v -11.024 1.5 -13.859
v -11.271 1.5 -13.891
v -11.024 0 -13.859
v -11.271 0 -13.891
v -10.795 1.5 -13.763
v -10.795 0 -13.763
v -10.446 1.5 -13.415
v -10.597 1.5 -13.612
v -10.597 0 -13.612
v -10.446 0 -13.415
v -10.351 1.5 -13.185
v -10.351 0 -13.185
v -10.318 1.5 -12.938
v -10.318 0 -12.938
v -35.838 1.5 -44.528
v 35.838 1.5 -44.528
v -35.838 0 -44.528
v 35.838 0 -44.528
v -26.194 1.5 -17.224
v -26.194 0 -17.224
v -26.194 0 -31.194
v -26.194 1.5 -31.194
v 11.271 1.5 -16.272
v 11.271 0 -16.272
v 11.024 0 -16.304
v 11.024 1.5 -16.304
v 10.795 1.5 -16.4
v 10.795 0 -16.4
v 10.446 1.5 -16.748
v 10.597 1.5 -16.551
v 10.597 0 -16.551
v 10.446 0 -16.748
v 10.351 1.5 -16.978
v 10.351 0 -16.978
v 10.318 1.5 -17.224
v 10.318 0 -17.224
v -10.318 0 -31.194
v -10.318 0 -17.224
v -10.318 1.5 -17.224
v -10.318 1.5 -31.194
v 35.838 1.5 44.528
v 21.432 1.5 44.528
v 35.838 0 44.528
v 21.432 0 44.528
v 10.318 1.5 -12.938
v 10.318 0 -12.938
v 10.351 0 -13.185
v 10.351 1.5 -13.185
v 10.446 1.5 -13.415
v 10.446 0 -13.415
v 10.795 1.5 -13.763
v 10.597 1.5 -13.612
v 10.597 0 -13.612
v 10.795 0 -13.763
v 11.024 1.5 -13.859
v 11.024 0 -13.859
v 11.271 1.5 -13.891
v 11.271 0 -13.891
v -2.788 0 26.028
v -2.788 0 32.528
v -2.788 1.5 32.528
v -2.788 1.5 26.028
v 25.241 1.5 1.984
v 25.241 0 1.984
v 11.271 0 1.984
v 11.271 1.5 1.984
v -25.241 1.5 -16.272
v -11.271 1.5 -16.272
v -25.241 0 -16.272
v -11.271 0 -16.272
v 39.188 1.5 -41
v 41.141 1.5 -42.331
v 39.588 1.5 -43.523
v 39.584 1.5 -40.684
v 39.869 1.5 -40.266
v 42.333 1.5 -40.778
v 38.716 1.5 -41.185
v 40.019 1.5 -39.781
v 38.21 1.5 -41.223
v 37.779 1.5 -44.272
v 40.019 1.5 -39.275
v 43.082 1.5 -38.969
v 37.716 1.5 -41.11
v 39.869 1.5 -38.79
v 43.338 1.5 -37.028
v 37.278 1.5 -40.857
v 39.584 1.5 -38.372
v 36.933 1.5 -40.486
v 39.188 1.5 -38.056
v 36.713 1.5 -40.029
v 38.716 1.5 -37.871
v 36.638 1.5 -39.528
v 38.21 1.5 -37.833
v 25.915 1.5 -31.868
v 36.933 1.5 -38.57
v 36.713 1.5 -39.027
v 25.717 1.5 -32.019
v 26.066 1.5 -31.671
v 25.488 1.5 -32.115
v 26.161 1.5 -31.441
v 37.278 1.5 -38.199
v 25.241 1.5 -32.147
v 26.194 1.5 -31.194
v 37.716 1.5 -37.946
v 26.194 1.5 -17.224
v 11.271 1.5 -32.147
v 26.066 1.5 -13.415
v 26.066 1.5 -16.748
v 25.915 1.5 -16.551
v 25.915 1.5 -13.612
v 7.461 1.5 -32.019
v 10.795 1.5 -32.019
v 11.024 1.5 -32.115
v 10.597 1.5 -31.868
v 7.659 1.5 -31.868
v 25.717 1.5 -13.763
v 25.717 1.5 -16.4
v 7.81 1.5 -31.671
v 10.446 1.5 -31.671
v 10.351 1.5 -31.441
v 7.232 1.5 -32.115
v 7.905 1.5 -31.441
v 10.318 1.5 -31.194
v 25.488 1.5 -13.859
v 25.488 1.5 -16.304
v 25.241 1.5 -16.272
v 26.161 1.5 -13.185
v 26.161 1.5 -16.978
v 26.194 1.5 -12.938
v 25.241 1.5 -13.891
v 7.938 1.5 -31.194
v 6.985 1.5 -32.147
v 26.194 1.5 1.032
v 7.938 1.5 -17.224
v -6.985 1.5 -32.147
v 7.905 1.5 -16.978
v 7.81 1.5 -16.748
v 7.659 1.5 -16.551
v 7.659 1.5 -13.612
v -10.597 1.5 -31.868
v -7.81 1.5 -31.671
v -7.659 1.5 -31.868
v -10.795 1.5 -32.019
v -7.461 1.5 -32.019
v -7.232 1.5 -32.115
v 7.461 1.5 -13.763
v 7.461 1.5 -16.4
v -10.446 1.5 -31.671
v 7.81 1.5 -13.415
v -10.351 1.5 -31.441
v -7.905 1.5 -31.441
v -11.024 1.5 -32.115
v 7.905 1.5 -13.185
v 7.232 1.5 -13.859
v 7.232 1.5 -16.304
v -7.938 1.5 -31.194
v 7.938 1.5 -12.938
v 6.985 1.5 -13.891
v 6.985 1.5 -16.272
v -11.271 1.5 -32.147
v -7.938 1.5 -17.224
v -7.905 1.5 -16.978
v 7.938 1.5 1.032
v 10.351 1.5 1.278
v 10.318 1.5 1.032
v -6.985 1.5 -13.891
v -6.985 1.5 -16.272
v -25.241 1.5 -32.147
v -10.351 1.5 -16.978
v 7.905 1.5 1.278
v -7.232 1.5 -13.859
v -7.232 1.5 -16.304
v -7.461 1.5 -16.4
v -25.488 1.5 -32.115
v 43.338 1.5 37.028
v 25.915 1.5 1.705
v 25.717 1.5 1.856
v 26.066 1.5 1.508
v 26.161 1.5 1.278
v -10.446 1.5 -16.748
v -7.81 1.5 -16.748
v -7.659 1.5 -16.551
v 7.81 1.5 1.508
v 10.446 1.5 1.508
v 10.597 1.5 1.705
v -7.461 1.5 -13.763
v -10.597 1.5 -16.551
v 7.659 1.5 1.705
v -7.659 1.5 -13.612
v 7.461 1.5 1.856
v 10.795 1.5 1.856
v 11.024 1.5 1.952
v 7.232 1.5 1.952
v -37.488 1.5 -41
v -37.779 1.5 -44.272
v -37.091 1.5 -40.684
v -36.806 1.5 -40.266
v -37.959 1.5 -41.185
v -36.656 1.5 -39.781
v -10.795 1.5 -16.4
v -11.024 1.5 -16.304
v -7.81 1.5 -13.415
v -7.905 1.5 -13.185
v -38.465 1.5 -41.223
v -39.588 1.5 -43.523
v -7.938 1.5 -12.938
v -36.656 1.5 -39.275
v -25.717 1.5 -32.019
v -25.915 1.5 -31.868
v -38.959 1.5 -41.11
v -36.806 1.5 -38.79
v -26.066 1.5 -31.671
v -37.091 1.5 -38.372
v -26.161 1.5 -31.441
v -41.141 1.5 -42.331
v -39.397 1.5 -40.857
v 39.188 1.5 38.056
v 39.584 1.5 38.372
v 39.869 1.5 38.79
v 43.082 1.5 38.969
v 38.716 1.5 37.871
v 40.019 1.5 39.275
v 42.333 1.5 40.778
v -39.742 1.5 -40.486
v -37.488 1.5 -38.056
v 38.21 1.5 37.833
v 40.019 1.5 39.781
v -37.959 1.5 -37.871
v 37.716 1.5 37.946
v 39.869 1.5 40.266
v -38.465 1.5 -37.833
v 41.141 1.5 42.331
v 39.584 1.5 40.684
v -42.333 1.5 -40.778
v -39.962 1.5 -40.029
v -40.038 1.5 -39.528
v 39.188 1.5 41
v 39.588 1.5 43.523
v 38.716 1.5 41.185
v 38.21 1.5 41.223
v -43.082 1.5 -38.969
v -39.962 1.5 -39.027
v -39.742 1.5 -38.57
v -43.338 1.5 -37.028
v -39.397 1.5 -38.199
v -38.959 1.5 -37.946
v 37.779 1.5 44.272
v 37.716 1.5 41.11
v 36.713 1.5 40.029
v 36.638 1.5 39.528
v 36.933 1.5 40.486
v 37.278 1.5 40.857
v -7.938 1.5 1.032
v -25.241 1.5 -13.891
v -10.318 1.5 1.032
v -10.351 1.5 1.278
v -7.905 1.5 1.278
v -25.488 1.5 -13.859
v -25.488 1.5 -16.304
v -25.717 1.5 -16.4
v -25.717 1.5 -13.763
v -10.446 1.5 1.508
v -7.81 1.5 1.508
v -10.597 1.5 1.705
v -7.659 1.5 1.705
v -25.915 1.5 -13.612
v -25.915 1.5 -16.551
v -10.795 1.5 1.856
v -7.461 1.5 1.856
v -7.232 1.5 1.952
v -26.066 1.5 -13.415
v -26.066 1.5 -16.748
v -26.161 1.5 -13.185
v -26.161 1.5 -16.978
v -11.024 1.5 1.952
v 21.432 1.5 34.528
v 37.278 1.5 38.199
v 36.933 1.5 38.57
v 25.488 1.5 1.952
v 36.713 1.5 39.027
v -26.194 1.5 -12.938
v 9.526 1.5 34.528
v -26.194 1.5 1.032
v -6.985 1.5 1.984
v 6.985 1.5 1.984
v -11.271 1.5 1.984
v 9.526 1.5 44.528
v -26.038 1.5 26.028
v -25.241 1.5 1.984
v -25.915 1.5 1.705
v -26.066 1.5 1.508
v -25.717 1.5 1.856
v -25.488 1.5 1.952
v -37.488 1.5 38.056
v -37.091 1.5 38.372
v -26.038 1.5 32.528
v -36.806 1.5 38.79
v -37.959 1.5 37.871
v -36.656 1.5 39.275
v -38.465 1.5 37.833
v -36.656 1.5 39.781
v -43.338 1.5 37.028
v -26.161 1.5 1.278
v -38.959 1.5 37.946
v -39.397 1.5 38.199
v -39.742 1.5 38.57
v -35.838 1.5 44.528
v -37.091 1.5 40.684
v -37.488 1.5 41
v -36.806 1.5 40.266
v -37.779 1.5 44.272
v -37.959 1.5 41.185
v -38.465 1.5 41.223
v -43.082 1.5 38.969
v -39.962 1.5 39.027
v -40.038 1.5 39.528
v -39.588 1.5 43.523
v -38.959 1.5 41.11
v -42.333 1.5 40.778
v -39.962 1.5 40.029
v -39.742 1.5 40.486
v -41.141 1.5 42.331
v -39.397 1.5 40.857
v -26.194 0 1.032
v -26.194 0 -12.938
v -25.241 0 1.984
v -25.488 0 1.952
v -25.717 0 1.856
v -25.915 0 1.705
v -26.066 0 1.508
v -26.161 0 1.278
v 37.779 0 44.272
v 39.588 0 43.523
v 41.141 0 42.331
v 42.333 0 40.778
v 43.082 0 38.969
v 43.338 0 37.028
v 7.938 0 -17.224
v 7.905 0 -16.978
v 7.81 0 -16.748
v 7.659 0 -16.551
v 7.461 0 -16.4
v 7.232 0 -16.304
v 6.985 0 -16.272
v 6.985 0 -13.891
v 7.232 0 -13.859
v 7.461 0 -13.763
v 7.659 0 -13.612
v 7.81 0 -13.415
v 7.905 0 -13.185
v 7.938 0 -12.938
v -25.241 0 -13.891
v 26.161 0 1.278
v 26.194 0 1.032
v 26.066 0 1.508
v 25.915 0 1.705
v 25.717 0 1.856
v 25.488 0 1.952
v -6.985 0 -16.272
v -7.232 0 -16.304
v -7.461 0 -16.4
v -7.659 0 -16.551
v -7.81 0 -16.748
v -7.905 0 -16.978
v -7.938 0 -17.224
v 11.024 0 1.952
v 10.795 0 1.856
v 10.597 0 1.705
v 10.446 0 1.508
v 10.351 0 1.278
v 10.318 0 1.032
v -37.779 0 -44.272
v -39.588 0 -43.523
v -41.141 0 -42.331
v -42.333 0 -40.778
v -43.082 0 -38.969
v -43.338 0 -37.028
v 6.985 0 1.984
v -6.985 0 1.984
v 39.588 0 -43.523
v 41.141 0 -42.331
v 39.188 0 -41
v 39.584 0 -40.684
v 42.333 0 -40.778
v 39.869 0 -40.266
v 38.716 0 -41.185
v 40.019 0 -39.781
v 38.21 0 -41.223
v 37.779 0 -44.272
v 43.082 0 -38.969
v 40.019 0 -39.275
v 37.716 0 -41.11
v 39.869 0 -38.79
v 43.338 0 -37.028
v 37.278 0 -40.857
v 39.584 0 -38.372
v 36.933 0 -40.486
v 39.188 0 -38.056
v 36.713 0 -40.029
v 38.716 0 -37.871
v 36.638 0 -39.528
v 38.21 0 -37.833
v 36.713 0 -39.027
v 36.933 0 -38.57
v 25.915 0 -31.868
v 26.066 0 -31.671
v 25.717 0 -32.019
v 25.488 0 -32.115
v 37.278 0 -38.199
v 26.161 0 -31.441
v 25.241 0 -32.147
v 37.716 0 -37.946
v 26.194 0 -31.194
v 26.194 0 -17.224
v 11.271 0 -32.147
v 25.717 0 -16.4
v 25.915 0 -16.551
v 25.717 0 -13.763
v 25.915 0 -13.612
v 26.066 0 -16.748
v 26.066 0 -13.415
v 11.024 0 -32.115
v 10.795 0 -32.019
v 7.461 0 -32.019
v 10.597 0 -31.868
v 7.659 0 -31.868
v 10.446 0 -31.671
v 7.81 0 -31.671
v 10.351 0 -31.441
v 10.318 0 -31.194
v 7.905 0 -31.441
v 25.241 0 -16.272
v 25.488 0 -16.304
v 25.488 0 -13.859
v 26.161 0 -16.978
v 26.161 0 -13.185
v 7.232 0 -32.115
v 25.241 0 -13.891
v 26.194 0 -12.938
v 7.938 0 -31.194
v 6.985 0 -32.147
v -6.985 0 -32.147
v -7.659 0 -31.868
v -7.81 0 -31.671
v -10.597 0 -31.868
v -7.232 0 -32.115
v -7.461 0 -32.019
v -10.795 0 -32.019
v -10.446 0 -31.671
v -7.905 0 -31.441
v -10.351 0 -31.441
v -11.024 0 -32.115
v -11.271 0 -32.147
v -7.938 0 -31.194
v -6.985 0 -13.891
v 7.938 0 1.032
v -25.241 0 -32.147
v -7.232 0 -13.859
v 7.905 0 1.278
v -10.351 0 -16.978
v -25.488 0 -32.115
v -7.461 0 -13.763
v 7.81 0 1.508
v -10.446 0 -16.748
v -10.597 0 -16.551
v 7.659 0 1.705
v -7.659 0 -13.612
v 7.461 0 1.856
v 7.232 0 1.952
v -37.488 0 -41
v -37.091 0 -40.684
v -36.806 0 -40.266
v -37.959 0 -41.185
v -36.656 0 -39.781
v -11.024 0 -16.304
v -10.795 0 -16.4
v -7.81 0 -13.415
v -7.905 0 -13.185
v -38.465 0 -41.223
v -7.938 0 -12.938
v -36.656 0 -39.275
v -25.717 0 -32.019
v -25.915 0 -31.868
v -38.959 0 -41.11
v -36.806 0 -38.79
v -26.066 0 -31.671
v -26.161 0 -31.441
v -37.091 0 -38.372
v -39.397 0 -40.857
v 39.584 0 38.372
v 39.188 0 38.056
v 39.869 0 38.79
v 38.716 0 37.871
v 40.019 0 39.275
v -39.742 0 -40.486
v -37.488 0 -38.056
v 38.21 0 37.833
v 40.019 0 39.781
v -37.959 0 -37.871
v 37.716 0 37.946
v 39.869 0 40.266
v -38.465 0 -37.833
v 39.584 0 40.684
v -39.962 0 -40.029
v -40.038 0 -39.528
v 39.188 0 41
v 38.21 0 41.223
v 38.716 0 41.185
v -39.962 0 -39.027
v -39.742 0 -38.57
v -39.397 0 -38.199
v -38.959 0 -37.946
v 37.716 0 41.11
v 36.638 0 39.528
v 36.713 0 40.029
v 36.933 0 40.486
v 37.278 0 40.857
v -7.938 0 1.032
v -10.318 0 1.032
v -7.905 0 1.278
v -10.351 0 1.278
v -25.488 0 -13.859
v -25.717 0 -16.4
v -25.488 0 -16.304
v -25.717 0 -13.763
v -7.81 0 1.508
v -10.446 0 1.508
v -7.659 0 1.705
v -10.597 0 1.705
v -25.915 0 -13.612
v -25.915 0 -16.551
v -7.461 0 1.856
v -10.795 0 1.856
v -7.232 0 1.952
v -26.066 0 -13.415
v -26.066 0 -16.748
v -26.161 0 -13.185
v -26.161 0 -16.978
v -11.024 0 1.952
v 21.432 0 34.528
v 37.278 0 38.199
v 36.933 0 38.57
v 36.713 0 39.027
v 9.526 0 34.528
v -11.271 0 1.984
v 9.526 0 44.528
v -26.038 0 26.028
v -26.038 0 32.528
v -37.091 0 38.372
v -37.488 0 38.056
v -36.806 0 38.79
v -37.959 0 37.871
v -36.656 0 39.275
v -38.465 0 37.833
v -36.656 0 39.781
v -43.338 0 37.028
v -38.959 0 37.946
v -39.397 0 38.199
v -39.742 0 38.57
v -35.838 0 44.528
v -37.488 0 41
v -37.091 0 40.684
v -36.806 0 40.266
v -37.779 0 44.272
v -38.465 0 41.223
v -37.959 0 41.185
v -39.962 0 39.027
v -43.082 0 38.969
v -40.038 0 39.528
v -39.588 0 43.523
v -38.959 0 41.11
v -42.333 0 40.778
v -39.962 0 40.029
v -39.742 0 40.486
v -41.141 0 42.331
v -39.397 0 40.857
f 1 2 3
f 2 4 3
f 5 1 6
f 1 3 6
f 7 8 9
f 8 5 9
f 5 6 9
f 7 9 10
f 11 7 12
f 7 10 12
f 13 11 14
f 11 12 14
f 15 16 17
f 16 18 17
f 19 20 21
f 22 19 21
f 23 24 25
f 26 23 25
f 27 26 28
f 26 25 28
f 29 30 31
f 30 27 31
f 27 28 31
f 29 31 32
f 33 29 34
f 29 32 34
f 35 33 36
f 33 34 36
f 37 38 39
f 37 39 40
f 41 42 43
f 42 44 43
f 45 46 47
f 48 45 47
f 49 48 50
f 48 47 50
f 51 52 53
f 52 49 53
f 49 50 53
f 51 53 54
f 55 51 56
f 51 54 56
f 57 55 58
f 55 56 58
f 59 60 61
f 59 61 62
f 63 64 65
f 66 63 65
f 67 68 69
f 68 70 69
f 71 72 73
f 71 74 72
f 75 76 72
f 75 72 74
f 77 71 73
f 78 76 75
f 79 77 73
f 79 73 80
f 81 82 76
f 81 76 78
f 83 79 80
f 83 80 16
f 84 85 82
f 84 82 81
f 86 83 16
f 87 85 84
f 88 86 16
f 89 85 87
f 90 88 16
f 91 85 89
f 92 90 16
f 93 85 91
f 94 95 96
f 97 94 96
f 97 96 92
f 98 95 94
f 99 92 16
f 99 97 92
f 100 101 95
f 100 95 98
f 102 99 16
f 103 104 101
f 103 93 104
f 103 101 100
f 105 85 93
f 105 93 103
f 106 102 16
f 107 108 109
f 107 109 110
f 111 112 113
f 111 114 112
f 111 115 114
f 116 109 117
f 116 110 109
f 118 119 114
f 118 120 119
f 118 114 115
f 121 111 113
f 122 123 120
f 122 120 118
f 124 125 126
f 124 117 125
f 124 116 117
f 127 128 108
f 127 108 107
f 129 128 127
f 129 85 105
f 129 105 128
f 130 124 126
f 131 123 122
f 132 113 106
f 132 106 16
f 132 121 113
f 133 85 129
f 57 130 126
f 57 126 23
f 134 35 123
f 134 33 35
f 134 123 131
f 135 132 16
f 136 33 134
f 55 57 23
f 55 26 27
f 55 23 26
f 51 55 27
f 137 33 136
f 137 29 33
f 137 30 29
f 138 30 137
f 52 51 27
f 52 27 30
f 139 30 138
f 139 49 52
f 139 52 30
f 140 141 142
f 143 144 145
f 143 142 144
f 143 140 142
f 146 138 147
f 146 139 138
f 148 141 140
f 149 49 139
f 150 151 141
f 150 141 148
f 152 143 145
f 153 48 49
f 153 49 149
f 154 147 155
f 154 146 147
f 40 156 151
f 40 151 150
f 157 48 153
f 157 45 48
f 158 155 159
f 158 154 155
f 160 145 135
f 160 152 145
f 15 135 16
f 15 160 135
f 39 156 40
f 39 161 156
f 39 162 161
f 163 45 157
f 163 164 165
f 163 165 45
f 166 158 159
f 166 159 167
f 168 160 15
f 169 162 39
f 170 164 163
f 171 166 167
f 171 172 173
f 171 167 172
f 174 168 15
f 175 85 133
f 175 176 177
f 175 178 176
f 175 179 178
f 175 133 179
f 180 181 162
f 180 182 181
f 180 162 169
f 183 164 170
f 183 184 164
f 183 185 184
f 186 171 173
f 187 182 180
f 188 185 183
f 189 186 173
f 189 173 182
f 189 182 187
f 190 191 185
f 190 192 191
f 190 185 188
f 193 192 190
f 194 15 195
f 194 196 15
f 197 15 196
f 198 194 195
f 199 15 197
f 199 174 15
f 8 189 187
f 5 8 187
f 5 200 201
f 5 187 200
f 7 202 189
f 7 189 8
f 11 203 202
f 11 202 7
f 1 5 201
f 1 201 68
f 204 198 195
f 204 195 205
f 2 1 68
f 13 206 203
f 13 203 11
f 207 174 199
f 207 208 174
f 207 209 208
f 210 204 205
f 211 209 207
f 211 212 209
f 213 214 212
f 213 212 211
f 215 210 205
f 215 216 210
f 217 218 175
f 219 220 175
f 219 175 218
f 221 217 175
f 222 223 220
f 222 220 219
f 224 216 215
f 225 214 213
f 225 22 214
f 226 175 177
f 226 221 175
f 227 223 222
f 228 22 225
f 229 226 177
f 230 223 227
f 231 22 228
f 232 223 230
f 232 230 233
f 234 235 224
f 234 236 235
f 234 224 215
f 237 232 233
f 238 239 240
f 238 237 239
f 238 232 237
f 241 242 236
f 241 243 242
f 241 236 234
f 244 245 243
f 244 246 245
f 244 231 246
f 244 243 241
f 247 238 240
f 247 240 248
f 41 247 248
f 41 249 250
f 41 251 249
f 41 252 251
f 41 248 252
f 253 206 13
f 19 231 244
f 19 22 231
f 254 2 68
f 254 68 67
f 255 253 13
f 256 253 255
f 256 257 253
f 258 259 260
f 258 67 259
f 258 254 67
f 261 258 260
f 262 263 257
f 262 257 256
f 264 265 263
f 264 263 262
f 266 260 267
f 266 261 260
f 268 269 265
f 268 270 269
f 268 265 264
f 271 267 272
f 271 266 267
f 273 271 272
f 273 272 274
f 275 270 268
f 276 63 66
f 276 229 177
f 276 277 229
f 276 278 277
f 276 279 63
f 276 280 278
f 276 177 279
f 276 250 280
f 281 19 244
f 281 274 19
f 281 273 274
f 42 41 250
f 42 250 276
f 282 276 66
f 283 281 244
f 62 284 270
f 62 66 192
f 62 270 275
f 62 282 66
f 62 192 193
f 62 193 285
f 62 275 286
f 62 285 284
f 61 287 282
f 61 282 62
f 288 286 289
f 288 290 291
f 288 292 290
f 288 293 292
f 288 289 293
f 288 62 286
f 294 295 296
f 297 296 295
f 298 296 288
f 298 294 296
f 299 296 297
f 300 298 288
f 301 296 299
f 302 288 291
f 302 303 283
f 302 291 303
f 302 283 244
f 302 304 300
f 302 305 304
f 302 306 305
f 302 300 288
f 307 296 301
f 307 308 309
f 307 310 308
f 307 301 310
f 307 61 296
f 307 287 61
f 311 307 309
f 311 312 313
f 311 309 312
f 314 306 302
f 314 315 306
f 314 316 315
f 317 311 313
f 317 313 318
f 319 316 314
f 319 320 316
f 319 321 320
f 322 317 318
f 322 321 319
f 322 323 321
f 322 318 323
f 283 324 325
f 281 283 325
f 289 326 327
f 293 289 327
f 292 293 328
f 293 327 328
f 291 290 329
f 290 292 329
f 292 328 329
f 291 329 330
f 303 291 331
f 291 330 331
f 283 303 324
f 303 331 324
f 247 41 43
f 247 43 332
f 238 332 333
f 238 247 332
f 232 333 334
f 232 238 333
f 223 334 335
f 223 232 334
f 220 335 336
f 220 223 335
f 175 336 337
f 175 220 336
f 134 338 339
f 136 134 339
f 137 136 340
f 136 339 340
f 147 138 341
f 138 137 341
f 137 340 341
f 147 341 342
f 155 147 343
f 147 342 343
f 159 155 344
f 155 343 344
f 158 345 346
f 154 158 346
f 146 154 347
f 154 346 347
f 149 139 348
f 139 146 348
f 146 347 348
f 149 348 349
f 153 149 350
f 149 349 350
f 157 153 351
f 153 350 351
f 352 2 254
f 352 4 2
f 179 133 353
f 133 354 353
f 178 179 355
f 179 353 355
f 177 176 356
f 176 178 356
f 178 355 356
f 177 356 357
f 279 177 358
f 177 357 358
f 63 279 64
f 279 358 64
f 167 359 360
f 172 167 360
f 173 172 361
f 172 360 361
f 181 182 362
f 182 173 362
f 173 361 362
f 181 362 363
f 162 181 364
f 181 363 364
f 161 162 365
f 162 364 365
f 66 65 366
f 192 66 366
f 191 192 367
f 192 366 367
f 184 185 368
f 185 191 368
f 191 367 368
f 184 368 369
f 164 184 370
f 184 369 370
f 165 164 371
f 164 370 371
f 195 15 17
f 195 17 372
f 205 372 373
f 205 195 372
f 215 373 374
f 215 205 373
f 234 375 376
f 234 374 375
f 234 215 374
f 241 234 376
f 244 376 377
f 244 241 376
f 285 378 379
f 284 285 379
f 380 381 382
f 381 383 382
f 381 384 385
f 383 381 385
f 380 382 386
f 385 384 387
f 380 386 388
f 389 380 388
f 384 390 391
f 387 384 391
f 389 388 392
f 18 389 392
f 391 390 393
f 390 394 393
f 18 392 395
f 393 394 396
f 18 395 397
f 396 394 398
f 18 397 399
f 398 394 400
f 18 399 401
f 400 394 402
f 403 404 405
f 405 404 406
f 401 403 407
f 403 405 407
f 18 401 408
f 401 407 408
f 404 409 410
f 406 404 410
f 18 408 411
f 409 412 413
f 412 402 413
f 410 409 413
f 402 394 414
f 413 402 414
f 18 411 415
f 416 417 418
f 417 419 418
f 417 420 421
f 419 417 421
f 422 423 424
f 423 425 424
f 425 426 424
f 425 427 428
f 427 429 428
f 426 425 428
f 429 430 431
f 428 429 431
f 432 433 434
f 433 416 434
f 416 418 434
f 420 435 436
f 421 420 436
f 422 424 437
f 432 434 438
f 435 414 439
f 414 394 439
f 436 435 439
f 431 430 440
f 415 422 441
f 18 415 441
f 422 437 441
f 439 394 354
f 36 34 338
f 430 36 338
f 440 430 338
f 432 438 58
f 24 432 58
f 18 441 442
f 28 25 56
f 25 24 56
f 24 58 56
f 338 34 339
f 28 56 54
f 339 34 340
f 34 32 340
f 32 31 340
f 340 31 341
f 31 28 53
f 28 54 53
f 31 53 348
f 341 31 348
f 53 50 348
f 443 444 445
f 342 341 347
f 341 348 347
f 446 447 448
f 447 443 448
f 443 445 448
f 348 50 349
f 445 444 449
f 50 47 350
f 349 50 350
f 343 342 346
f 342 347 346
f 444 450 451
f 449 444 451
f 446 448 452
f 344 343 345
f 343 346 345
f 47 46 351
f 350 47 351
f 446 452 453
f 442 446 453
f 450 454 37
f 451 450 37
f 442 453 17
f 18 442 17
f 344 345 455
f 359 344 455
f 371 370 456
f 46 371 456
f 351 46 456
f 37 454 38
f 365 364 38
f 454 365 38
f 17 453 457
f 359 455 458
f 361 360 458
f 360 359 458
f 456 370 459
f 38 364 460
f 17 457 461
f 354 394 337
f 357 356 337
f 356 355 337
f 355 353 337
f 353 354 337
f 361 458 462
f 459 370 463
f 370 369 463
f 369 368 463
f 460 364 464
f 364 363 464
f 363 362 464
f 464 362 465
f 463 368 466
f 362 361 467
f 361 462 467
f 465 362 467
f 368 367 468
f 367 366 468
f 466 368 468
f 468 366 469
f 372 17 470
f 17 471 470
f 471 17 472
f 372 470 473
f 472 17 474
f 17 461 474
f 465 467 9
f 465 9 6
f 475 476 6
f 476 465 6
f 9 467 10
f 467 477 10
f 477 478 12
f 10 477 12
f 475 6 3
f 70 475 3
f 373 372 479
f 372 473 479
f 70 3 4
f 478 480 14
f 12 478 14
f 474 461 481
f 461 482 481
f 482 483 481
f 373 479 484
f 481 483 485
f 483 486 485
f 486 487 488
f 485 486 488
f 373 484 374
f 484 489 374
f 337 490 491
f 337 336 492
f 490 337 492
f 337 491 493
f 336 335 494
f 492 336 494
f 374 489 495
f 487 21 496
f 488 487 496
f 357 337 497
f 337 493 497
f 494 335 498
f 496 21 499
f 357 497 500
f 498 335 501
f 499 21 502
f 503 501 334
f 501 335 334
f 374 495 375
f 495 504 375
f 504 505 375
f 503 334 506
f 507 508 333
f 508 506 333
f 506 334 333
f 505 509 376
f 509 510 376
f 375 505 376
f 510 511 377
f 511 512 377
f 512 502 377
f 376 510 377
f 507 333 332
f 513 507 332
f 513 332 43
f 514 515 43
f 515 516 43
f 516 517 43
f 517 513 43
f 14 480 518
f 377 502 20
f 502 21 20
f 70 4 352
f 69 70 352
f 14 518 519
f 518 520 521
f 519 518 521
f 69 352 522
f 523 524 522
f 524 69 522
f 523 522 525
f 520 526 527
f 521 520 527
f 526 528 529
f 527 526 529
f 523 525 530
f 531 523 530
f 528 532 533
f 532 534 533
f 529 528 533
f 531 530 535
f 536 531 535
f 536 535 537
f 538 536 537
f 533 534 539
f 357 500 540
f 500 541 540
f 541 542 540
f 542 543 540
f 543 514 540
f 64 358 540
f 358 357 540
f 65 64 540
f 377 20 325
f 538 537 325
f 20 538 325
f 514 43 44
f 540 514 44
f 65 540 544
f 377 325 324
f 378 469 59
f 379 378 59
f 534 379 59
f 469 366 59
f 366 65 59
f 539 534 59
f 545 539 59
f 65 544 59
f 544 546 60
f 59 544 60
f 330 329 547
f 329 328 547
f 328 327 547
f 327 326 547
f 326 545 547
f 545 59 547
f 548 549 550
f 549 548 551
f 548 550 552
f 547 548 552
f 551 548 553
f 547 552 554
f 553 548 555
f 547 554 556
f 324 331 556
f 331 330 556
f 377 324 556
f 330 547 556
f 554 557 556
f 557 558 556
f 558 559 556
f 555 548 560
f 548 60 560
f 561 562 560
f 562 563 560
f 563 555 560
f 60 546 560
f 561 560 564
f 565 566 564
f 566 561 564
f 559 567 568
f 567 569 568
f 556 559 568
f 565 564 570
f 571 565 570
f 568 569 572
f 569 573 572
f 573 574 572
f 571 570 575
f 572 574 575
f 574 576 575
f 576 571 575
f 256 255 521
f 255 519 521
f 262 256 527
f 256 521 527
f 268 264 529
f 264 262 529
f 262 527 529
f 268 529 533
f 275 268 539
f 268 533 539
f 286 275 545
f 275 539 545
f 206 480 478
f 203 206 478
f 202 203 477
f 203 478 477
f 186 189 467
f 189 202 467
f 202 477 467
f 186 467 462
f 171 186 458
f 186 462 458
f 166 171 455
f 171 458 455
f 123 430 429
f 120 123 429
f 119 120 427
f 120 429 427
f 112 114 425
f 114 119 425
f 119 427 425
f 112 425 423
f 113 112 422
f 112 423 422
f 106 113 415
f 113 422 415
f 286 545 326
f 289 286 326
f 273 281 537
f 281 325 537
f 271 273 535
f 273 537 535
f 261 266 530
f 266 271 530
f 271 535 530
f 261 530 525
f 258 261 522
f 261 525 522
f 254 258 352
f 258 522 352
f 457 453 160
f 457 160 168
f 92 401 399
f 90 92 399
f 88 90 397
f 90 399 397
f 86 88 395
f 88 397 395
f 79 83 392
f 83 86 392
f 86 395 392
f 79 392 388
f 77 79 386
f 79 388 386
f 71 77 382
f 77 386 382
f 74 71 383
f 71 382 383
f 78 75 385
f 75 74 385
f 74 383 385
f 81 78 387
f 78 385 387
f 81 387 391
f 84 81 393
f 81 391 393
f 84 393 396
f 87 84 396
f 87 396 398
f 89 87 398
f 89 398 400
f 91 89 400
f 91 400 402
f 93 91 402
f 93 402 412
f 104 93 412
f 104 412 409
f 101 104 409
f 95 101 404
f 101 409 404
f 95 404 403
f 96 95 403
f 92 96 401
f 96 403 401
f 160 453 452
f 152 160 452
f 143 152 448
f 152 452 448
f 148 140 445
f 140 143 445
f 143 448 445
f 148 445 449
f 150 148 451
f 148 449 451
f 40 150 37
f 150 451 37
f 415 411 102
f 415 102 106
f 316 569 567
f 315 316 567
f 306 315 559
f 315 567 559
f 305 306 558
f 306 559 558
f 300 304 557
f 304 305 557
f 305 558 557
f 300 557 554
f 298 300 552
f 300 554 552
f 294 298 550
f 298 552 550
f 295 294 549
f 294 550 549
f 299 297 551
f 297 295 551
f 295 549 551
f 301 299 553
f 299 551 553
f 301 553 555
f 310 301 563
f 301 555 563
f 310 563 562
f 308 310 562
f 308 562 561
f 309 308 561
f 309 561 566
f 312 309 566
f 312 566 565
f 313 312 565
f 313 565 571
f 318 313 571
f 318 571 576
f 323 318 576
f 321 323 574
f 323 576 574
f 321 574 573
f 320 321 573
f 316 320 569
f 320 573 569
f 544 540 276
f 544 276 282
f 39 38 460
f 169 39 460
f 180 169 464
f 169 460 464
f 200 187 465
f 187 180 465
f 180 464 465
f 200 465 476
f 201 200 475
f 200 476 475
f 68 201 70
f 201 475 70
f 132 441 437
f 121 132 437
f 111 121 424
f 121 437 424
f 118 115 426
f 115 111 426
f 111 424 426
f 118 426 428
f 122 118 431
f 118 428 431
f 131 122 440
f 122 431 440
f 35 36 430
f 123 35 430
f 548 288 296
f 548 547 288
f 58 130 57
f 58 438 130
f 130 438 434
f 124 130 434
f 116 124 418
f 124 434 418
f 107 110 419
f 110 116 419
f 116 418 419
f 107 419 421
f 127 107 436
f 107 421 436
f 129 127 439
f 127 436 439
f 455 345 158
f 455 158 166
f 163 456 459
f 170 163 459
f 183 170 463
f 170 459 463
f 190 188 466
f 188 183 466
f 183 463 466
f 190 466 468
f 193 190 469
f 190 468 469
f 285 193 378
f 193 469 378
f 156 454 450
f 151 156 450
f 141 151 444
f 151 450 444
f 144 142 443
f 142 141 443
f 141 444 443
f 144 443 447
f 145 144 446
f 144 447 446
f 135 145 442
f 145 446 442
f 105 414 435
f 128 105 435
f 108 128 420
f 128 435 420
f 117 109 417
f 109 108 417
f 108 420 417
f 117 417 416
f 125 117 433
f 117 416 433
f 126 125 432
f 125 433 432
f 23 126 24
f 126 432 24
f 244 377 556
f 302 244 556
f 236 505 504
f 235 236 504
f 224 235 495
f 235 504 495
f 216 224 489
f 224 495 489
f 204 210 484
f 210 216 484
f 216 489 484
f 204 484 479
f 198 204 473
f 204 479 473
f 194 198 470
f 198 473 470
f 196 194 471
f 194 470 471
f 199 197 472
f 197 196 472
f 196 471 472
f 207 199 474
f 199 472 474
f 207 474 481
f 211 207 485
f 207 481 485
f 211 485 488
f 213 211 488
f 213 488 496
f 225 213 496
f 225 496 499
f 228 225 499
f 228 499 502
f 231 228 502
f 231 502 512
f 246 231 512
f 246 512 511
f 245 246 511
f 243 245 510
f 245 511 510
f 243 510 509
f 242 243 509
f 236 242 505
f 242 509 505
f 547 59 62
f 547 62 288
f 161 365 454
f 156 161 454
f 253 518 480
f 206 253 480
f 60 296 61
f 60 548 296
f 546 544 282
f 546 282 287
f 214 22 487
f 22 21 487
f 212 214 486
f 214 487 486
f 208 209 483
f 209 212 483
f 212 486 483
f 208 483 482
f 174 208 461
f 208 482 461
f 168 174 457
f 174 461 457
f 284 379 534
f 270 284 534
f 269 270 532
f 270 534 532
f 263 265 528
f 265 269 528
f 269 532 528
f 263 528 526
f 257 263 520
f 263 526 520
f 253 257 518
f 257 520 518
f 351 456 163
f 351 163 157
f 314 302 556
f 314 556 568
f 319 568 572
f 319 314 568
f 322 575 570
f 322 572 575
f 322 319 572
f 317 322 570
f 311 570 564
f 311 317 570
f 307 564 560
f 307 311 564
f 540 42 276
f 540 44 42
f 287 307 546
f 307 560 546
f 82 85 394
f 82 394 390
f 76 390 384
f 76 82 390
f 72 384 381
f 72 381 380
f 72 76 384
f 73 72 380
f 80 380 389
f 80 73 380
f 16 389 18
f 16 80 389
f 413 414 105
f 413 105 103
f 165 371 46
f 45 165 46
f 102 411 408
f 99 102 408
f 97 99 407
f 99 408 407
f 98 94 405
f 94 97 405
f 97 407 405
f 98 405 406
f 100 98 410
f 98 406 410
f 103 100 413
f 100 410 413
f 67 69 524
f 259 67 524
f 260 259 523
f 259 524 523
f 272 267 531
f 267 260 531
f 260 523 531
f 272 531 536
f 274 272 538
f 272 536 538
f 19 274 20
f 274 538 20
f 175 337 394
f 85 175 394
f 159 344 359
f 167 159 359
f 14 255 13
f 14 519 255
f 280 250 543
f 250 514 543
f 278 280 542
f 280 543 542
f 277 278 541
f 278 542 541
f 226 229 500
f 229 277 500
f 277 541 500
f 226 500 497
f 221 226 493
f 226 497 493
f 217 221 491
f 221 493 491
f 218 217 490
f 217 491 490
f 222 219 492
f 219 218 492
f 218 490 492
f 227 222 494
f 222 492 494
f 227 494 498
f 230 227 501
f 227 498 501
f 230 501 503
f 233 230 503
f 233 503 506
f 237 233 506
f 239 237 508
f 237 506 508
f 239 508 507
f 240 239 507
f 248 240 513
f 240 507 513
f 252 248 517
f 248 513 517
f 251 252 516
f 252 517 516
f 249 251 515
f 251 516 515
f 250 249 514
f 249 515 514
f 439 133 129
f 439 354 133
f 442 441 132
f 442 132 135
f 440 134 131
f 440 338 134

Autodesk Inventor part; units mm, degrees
ref_plane "YZ Plane" through (0, 0, 0) normal (1, 0, 0) x (0, 1, 0)
ref_plane "XZ Plane" through (0, 0, 0) normal (0, 1, 0) x (-1, 0, 0)
ref_plane "XY Plane" through (0, 0, 0) normal (0, 0, 1) x (1, 0, 0)
sketch "Sketch3" plane through (0, 0, 0) normal (0, 1, 0) x (-1, 0, 0)
  line L0 (-25.241, 1.984) -> (-11.271, 1.984)
  line L1 (-25.241, -13.891) -> (-11.271, -13.891)
  line L2 (-26.1935, 1.0315) -> (-26.1935, -12.9385)
  line L3 (-10.3185, 1.0315) -> (-10.3185, -12.9385)
  arc A0 (-25.241, 1.984) -> (-26.1935, 1.0315) centre (-25.241, 1.0315) ccw
  arc A1 (-10.3185, 1.0315) -> (-11.271, 1.984) centre (-11.271, 1.0315) ccw
  arc A2 (-26.1935, -12.9385) -> (-25.241, -13.891) centre (-25.241, -12.9385) ccw
  arc A3 (-11.271, -13.891) -> (-10.3185, -12.9385) centre (-11.271, -12.9385) ccw
  line L4 (-6.985, 1.984) -> (6.985, 1.984)
  line L5 (-6.985, -13.891) -> (6.985, -13.891)
  line L6 (-7.9375, 1.0315) -> (-7.9375, -12.9385)
  line L7 (7.9375, 1.0315) -> (7.9375, -12.9385)
  arc A4 (-6.985, 1.984) -> (-7.9375, 1.0315) centre (-6.985, 1.0315) ccw
  arc A5 (7.9375, 1.0315) -> (6.985, 1.984) centre (6.985, 1.0315) ccw
  arc A6 (-7.9375, -12.9385) -> (-6.985, -13.891) centre (-6.985, -12.9385) ccw
  arc A7 (6.985, -13.891) -> (7.9375, -12.9385) centre (6.985, -12.9385) ccw
  line L8 (11.271, 1.984) -> (25.241, 1.984)
  line L9 (11.271, -13.891) -> (25.241, -13.891)
  line L10 (10.3185, 1.0315) -> (10.3185, -12.9385)
  line L11 (26.1935, 1.0315) -> (26.1935, -12.9385)
  arc A8 (11.271, 1.984) -> (10.3185, 1.0315) centre (11.271, 1.0315) ccw
  arc A9 (26.1935, 1.0315) -> (25.241, 1.984) centre (25.241, 1.0315) ccw
  arc A10 (10.3185, -12.9385) -> (11.271, -13.891) centre (11.271, -12.9385) ccw
  arc A11 (25.241, -13.891) -> (26.1935, -12.9385) centre (25.241, -12.9385) ccw
  line L12 (-25.241, -16.272) -> (-11.271, -16.272)
  line L13 (-25.241, -32.147) -> (-11.271, -32.147)
  line L14 (-26.1935, -17.2245) -> (-26.1935, -31.1945)
  line L15 (-10.3185, -17.2245) -> (-10.3185, -31.1945)
  arc A12 (-25.241, -16.272) -> (-26.1935, -17.2245) centre (-25.241, -17.2245) ccw
  arc A13 (-10.3185, -17.2245) -> (-11.271, -16.272) centre (-11.271, -17.2245) ccw
  arc A14 (-26.1935, -31.1945) -> (-25.241, -32.147) centre (-25.241, -31.1945) ccw
  arc A15 (-11.271, -32.147) -> (-10.3185, -31.1945) centre (-11.271, -31.1945) ccw
  line L16 (-6.985, -16.272) -> (6.985, -16.272)
  line L17 (-6.985, -32.147) -> (6.985, -32.147)
  line L18 (-7.9375, -17.2245) -> (-7.9375, -31.1945)
  line L19 (7.9375, -17.2245) -> (7.9375, -31.1945)
  arc A16 (-6.985, -16.272) -> (-7.9375, -17.2245) centre (-6.985, -17.2245) ccw
  arc A17 (7.9375, -17.2245) -> (6.985, -16.272) centre (6.985, -17.2245) ccw
  arc A18 (-7.9375, -31.1945) -> (-6.985, -32.147) centre (-6.985, -31.1945) ccw
  arc A19 (6.985, -32.147) -> (7.9375, -31.1945) centre (6.985, -31.1945) ccw
  line L20 (11.271, -16.272) -> (25.241, -16.272)
  line L21 (11.271, -32.147) -> (25.241, -32.147)
  line L22 (10.3185, -17.2245) -> (10.3185, -31.1945)
  line L23 (26.1935, -17.2245) -> (26.1935, -31.1945)
  arc A20 (11.271, -16.272) -> (10.3185, -17.2245) centre (11.271, -17.2245) ccw
  arc A21 (26.1935, -17.2245) -> (25.241, -16.272) centre (25.241, -17.2245) ccw
  arc A22 (10.3185, -31.1945) -> (11.271, -32.147) centre (11.271, -31.1945) ccw
  arc A23 (25.241, -32.147) -> (26.1935, -31.1945) centre (25.241, -31.1945) ccw
  line L24 (-33.3375, -34.528) -> (33.3375, -34.528)
  line L25 (-33.3375, 34.528) -> (33.3375, 34.528)
  line L26 (-33.3375, -34.528) -> (-33.3375, 34.528)
  line L27 (33.3375, -34.528) -> (33.3375, 34.528)
  line L28 (-33.3375, 34.528) -> (-22.4409, 34.528) construction
  line L29 (-22.4409, 34.528) -> (-3.9497, 34.528)
  line L30 (-43.3375, -44.528) -> (43.3375, -44.528)
  line L31 (43.3375, -44.528) -> (43.3375, 44.528)
  line L32 (43.3375, 44.528) -> (-43.3375, 44.528)
  line L33 (-43.3375, 44.528) -> (-43.3375, -44.528)
  circle A24 centre (-38.3375, -39.528) radius 1.7
  circle A25 centre (38.3375, -39.528) radius 1.7
  circle A26 centre (-38.3375, 39.528) radius 1.7
  circle A27 centre (38.3375, 39.528) radius 1.7
  line L34 (-22.4409, 34.528) -> (-3.9409, 34.528)
  line L35 (-21.4315, 34.528) -> (-9.5255, 34.528)
  line L36 (-9.5255, 34.528) -> (-9.5255, 48.1303)
  line L37 (-9.5255, 48.1303) -> (-21.4315, 48.1303)
  line L38 (-21.4315, 48.1303) -> (-21.4315, 34.528)
  line L39 (2.7875, 26.028) -> (26.0375, 26.028)
  line L40 (26.0375, 26.028) -> (26.0375, 32.528)
  line L41 (26.0375, 32.528) -> (2.7875, 32.528)
  line L42 (2.7875, 32.528) -> (2.7875, 26.028)
  point P0 (0, 0)
  point P1 (-10.3185, -5.9535)
  point P2 (0, 0)
  point P3 (-21.4315, 44.528)
  point P4 (-9.5255, 44.528)
  point P5 (-9.5255, 34.528)
  dimension "d13" = 2.381
  dimension "d14" = 7.144
  dimension "d15" = 66.675
  dimension "d16" = 69.056
  dimension "d17" = 7.144
  dimension "d18" = 13.97
  dimension "d19" = 13.97
  dimension "d20" = 2.381
  dimension "d21" = 13.97
  dimension "d22" = 13.97
  dimension "d23" = 13.97
  dimension "d24" = 2.381
  dimension "d25" = 2.381
  dimension "d46" = 10
  dimension "d47" = 10
  dimension "d48" = 3.4
  dimension "d49" = 3.4
  dimension "d50" = 3.4
  dimension "d51" = 3.4
  dimension "d52" = 5
  dimension "d53" = 5
  dimension "d54" = 5
  dimension "d55" = 5
  dimension "d56" = 5
  dimension "d57" = 5
  dimension "d58" = 5
  dimension "d59" = 5
  dimension "d62" = 11.906
  dimension "d66" = 23.25
  dimension "d67" = 6.5
  dimension "d72" = 7.3
  dimension "d73" = 2
  dimension "d74" = 10
extrude "Extrusion4" add sketch "Sketch3" along normal blind 1.5 contours L26 L25 L27 L24 | L24 L27 L25 L36 L32 L31 L30 L33 L38 L26
fillet "Fillet4" radius 7.5 4 edges at (-43.3375, 0.75, -44.528) (-43.3375, 0.75, 44.528) (43.3375, 0.75, -44.528) (43.3375, 0.75, 44.528)
properties part number "case top"
